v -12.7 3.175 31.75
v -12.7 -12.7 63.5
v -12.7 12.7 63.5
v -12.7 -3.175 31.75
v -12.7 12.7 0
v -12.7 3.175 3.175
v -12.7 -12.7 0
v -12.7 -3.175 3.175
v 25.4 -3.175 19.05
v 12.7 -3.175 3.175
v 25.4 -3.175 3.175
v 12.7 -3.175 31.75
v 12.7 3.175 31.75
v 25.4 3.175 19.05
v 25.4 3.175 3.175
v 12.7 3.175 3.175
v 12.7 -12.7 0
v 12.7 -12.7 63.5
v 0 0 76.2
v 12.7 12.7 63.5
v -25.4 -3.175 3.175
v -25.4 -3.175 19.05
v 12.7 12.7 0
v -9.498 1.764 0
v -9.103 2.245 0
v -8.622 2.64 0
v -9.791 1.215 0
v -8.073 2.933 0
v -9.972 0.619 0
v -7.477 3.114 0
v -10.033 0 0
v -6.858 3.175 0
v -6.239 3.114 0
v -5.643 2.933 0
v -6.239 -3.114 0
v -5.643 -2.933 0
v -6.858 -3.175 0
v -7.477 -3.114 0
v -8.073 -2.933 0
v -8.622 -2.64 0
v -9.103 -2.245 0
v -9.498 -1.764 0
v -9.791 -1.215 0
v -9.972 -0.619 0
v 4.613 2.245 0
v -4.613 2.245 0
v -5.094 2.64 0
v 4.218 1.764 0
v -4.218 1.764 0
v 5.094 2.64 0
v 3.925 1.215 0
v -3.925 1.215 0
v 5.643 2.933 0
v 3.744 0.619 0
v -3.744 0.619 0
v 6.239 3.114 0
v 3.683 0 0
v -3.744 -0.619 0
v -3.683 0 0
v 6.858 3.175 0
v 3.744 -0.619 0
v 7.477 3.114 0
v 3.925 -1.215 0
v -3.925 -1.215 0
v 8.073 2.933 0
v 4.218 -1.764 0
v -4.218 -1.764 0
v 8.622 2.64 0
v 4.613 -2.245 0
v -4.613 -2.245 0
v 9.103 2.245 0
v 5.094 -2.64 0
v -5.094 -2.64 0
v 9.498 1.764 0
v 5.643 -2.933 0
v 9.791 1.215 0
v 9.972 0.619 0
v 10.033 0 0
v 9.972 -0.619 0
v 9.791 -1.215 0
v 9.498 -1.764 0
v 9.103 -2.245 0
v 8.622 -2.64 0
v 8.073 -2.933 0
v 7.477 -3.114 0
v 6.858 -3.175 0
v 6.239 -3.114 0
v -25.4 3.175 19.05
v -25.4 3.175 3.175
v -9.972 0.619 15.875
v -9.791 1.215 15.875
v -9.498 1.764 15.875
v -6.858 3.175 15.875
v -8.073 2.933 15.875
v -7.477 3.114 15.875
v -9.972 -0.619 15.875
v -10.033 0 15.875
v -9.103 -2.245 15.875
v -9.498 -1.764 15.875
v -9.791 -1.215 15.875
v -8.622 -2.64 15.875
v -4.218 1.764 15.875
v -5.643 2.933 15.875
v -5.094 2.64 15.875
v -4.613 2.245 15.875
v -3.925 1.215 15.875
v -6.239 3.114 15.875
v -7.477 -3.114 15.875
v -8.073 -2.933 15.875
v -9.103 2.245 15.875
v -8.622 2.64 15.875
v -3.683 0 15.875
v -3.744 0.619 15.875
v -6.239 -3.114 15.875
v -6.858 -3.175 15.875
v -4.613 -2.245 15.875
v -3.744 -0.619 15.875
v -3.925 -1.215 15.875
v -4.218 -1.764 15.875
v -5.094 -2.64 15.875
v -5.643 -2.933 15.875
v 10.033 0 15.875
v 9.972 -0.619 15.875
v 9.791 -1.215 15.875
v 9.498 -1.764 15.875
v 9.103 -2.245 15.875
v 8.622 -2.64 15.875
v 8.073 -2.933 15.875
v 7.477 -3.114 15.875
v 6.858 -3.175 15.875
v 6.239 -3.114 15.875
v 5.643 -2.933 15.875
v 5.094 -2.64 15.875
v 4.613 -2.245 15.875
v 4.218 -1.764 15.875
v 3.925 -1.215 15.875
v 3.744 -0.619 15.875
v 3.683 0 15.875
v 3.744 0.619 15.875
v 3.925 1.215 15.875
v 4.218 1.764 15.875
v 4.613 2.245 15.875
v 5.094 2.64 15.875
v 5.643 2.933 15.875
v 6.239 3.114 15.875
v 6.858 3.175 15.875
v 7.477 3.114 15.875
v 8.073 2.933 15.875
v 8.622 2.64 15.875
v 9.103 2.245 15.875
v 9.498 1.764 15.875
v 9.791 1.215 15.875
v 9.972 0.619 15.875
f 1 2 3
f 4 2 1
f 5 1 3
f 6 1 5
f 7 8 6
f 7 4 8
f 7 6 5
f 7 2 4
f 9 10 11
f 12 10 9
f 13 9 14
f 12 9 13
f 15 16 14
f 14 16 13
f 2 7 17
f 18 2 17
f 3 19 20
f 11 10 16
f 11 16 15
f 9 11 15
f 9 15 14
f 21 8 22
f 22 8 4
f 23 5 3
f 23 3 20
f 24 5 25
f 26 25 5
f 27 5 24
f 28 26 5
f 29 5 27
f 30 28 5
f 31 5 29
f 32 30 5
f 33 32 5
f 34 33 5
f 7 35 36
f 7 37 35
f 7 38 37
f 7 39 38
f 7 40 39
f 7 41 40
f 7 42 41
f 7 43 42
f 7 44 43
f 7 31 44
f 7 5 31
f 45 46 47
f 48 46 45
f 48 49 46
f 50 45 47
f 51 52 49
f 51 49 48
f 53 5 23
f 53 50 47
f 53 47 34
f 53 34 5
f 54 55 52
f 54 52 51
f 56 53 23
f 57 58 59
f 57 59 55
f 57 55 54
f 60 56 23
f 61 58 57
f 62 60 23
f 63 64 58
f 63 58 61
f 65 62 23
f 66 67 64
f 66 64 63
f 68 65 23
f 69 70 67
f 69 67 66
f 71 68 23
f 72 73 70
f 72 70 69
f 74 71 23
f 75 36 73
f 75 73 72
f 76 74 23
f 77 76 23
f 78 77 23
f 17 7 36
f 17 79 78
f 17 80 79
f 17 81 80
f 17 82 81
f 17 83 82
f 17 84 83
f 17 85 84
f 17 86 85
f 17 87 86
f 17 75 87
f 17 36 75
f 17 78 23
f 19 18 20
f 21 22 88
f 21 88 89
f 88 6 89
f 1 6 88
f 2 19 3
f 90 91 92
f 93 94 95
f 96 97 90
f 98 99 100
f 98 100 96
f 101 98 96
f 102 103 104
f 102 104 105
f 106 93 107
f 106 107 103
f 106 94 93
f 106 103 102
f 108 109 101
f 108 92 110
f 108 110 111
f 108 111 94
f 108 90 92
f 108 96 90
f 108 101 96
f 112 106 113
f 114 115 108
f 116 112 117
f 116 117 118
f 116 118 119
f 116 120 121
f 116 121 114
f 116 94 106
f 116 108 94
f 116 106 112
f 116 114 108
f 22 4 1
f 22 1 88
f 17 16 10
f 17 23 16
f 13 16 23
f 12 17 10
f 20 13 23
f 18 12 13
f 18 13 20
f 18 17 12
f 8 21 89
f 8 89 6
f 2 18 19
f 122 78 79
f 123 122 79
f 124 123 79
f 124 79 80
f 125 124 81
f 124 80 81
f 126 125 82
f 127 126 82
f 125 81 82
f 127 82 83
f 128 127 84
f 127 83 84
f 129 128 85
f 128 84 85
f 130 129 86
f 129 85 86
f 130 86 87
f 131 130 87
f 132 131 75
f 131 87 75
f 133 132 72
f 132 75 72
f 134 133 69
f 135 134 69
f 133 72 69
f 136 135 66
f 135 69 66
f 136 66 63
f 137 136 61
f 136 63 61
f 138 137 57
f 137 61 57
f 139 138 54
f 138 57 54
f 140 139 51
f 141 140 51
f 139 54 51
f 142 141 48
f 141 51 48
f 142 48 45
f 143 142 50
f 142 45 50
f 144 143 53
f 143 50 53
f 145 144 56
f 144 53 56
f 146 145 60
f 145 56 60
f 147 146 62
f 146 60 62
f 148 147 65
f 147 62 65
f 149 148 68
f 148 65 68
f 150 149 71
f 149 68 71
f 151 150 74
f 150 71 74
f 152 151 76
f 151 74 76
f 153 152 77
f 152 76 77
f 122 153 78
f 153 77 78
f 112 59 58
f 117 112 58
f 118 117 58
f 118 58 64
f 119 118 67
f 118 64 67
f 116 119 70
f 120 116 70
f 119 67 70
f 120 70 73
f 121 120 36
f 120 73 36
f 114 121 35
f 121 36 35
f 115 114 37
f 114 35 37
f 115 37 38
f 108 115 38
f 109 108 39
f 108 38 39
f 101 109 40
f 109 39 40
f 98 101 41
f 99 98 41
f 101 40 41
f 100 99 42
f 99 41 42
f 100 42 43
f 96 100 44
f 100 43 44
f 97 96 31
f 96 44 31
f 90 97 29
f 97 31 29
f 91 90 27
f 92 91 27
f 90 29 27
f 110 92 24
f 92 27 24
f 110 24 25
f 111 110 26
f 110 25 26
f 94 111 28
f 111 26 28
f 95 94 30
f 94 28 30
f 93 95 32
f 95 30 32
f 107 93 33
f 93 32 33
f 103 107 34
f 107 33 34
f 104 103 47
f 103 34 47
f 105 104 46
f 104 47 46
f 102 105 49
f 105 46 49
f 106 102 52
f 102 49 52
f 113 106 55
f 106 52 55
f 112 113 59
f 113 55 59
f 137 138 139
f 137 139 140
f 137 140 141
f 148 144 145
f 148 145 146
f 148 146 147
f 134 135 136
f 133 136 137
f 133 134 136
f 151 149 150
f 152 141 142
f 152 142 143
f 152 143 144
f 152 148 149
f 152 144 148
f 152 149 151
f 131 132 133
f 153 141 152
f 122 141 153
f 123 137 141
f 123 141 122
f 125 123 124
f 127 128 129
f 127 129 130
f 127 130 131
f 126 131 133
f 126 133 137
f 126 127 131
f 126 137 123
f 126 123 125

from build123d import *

# Parameters (mm, degrees)
F1_DEPTH = 12.7
F2_W     = 25.4
F2_H     = 76.2
F2_W_2   = 6.35
F2_H_2   = 28.575
F3_DEPTH = 12.701
F4_W     = 9.525
F4_H     = 28.575
F5_DEPTH = 12.701
F7_DEPTH = 38.101
F8_R     = 3.175
F9_DEPTH = 15.875


with BuildPart() as f1:
    # F0 (on Front) → F1 (new body, symmetric)
    with BuildSketch(Plane.XZ):
        Polygon((12.7, 63.5), (0, 76.2), (-12.7, 63.5), (-12.7, 31.75), (-25.4, 19.05), (-25.4, 3.175), (-12.7, 3.175), (-12.7, 0), (0, 0), (12.7, 0), (12.7, 3.175), (25.4, 3.175), (25.4, 19.05), (12.7, 31.75), align=None)
    extrude(amount=F1_DEPTH, both=True)

    # F2 (on face) → F3 (cut, through all)
    with BuildSketch(Plane.YZ.offset(12.7)):
        with Locations((0, 38.1)):
            Rectangle(F2_W, F2_H)
        with Locations((0, 17.4625)):
            Rectangle(F2_W_2, F2_H_2, mode=Mode.SUBTRACT)
    extrude(amount=F3_DEPTH, mode=Mode.SUBTRACT)

    # F4 (on face) → F5 (cut, through all)
    with BuildSketch(Plane(origin=(-12.7, 0, 0), x_dir=(0, -1, 0), z_dir=(-1, 0, 0))):
        with Locations((-7.9375, 17.4625)):
            Rectangle(F4_W, F4_H)
        with Locations((7.9375, 17.4625)):
            Rectangle(F4_W, F4_H)
    extrude(amount=F5_DEPTH, mode=Mode.SUBTRACT)

    # F6 (on face) → F7 (cut, through all)
    with BuildSketch(Plane.YZ.offset(12.7)):
        Polygon((-12.7, 76.2), (-12.7, 63.5), (0, 76.2), align=None)
        Polygon((12.7, 76.2), (0, 76.2), (12.7, 63.5), align=None)
    extrude(amount=-F7_DEPTH, mode=Mode.SUBTRACT)

    # F8 (on face) → F9 (cut)
    with BuildSketch(Plane(origin=(0, 0, 0), x_dir=(1, 0, 0), z_dir=(0, 0, -1))):
        with Locations((6.858, 0)):
            Circle(F8_R)
        with Locations((-6.858, 0)):
            Circle(F8_R)
    extrude(amount=-F9_DEPTH, mode=Mode.SUBTRACT)


solid = f1.part
